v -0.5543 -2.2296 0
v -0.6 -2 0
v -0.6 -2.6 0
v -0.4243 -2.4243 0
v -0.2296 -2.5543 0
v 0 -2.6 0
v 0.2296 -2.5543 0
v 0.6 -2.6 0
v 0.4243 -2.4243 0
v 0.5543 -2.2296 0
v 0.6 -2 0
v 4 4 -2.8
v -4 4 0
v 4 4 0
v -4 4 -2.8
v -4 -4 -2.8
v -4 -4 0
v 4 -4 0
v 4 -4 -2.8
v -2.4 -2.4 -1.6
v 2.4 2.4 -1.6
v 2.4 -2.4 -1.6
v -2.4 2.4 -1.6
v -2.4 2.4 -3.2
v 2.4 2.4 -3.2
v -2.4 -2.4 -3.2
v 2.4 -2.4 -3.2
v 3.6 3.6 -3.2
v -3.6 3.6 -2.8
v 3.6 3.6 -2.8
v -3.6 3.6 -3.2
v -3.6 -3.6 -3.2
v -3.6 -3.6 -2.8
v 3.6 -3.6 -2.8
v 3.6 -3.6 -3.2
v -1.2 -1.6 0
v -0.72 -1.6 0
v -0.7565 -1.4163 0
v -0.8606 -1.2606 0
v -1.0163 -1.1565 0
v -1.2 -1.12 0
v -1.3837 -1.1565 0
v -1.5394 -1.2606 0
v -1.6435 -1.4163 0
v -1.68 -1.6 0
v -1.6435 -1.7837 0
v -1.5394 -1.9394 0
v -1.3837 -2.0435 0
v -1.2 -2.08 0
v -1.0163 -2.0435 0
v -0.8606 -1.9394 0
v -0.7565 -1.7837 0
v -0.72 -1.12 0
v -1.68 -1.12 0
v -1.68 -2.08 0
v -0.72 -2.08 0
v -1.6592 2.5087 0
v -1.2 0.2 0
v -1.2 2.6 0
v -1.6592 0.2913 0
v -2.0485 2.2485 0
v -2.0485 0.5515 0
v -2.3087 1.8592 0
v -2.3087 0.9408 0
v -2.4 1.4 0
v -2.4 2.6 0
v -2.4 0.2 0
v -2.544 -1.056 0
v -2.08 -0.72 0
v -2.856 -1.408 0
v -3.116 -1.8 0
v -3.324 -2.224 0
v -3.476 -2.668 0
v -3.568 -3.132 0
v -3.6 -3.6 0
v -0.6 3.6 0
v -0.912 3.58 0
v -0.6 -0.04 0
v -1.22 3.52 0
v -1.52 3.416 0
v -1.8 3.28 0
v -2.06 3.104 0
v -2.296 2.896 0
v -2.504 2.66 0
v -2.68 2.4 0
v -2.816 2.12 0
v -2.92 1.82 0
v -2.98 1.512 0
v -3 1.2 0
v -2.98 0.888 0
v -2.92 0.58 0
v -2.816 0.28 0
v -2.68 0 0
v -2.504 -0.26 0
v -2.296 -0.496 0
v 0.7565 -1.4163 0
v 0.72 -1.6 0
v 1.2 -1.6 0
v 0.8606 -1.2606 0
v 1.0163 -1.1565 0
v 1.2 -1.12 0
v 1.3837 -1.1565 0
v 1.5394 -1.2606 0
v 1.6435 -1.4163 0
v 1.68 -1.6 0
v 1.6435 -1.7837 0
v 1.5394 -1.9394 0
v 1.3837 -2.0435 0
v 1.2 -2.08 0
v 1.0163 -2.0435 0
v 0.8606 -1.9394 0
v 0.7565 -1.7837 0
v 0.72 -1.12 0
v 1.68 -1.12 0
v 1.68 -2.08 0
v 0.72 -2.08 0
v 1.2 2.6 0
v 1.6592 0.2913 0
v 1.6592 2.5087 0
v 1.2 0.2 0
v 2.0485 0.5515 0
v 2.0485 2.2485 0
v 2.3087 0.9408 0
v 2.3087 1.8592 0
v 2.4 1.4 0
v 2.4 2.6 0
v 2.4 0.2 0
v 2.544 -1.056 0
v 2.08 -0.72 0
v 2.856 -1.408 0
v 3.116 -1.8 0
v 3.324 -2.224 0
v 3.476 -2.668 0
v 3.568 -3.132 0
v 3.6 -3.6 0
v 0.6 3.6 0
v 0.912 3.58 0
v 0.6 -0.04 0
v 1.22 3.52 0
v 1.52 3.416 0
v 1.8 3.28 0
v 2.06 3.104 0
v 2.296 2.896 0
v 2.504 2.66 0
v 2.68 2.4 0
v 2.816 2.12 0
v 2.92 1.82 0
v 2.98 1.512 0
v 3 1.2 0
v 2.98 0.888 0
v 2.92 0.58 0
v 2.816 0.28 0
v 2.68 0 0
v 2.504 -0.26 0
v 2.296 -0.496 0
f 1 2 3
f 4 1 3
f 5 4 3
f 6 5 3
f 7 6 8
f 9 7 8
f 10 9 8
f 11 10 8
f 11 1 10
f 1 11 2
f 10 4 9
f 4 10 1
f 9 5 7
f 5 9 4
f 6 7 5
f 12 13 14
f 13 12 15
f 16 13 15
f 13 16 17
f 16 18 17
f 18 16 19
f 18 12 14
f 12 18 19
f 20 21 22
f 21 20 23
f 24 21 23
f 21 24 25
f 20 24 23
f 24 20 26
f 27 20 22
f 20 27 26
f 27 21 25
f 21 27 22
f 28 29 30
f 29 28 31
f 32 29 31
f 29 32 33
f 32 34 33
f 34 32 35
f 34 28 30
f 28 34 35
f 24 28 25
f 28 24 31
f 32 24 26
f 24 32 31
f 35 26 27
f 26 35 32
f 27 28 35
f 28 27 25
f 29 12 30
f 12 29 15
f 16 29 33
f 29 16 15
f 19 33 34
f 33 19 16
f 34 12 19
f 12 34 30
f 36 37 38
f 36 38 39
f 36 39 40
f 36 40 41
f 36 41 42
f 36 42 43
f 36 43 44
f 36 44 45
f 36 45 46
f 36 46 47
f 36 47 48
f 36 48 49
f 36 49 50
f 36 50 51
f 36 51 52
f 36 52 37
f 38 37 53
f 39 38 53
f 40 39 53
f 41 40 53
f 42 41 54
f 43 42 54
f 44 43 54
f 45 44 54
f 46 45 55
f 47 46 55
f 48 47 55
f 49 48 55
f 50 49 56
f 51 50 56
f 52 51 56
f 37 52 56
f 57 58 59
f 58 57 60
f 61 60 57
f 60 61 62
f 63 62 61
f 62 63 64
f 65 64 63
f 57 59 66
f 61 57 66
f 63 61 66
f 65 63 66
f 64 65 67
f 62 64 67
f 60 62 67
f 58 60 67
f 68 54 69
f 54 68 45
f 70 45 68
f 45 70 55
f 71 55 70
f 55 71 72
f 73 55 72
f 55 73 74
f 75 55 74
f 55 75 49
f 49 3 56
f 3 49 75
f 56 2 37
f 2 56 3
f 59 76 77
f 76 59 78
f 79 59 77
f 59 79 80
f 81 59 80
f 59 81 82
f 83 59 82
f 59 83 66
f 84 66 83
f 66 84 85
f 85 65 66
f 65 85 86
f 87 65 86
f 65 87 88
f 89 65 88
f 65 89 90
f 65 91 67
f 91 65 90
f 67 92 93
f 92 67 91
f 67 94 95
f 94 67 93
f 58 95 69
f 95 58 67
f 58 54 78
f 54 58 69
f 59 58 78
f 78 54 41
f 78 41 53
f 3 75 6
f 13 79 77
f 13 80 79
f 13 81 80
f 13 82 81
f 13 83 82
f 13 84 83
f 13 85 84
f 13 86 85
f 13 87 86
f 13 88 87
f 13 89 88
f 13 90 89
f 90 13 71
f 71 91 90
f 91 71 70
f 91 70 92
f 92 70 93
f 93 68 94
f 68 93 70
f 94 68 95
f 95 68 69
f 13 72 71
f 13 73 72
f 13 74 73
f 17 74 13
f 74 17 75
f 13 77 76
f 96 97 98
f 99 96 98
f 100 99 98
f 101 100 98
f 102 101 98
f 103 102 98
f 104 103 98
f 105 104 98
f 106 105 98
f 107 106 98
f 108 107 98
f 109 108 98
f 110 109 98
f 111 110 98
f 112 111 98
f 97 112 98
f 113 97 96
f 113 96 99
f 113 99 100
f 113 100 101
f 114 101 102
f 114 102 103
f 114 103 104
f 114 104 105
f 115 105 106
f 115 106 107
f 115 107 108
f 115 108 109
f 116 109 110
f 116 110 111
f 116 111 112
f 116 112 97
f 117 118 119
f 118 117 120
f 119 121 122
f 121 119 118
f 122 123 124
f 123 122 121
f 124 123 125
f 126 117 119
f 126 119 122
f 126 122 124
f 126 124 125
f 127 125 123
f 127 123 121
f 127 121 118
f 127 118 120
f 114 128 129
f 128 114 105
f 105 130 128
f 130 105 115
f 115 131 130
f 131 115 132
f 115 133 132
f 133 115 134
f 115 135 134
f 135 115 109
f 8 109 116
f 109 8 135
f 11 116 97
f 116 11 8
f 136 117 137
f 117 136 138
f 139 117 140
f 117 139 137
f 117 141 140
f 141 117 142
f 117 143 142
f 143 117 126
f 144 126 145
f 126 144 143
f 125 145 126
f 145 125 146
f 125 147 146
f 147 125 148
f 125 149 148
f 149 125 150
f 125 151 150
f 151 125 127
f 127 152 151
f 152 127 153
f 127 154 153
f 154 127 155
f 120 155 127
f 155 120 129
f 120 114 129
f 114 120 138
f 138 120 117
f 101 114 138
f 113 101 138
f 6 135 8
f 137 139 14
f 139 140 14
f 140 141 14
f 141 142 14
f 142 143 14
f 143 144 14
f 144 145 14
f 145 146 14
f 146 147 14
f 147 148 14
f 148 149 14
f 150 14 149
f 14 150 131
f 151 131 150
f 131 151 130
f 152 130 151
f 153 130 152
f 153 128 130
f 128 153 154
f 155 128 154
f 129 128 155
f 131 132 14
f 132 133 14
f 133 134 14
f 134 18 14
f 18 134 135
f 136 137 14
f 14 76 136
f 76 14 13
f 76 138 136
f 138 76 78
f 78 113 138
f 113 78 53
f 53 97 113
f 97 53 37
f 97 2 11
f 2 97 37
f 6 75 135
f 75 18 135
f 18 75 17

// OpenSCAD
// file: ../p/box5.scad
use <../lib.scad>
function ldraw_lib__box5() = [
// 0 Box with 5 Faces and All Edges
// 0 Name: box5.dat
// 0 Author: James Jessiman
// 0 !LDRAW_ORG Primitive UPDATE 2012-01
// 0 !LICENSE Licensed under CC BY 2.0 and CC BY 4.0 : see CAreadme.txt
// 
// 0 BFC CERTIFY CCW
  [0,"BFC","CERTIFY"],
  [0,"BFC","CCW"],
// 
// 0 !HISTORY 2002-04-03 [sbliss] Modified for BFC compliance
// 0 !HISTORY 2002-04-25 [PTadmin] Official Update 2002-02
// 0 !HISTORY 2007-06-24 [PTadmin] Header formatted for Contributor Agreement
// 0 !HISTORY 2008-07-01 [PTadmin] Official Update 2008-01
// 0 !HISTORY 2012-02-16 [Philo] Changed to CCW
// 0 !HISTORY 2012-03-30 [PTadmin] Official Update 2012-01
// 
// 
// 2 24 1 1 1 -1 1 1
  [2,24,1,1,1,-1,1,1],
// 2 24 -1 1 1 -1 1 -1
  [2,24,-1,1,1,-1,1,-1],
// 2 24 -1 1 -1 1 1 -1
  [2,24,-1,1,-1,1,1,-1],
// 2 24 1 1 -1 1 1 1
  [2,24,1,1,-1,1,1,1],
// 2 24 1 0 1 -1 0 1
  [2,24,1,0,1,-1,0,1],
// 2 24 -1 0 1 -1 0 -1
  [2,24,-1,0,1,-1,0,-1],
// 2 24 -1 0 -1 1 0 -1
  [2,24,-1,0,-1,1,0,-1],
// 2 24 1 0 -1 1 0 1
  [2,24,1,0,-1,1,0,1],
// 2 24 1 0 1 1 1 1
  [2,24,1,0,1,1,1,1],
// 2 24 -1 0 1 -1 1 1
  [2,24,-1,0,1,-1,1,1],
// 2 24 1 0 -1 1 1 -1
  [2,24,1,0,-1,1,1,-1],
// 2 24 -1 0 -1 -1 1 -1
  [2,24,-1,0,-1,-1,1,-1],
// 4 16 -1 1 1 1 1 1 1 1 -1 -1 1 -1
  [4,16,-1,1,1,1,1,1,1,1,-1,-1,1,-1],
// 4 16 -1 1 1 -1 0 1 1 0 1 1 1 1
  [4,16,-1,1,1,-1,0,1,1,0,1,1,1,1],
// 4 16 -1 1 -1 -1 0 -1 -1 0 1 -1 1 1
  [4,16,-1,1,-1,-1,0,-1,-1,0,1,-1,1,1],
// 4 16 1 1 -1 1 0 -1 -1 0 -1 -1 1 -1
  [4,16,1,1,-1,1,0,-1,-1,0,-1,-1,1,-1],
// 4 16 1 1 1 1 0 1 1 0 -1 1 1 -1
  [4,16,1,1,1,1,0,1,1,0,-1,1,1,-1],
];
module ldraw_lib__box5(step=0, col=false, unit=2/5, alt=false, line=0.2, solid=!$preview)
    makepoly(ldraw_lib__box5(), step=step, col=col, unit=unit, alt=alt, line=line, solid=solid);
ldraw_lib__box5(line=0.2);
// file: ../p/box4.scad
use <../lib.scad>
function ldraw_lib__box4() = [
// 0 Box with 4 Faces (2 Parallel Pairs) and All Edges
// 0 Name: box4.dat
// 0 Author: James Jessiman
// 0 !LDRAW_ORG Primitive UPDATE 2012-01
// 0 !LICENSE Licensed under CC BY 2.0 and CC BY 4.0 : see CAreadme.txt
// 
// 0 BFC CERTIFY CCW
  [0,"BFC","CERTIFY"],
  [0,"BFC","CCW"],
// 
// 0 !HISTORY 2002-04-03 [sbliss] Modified for BFC compliance
// 0 !HISTORY 2002-04-25 [PTadmin] Official Update 2002-02
// 0 !HISTORY 2007-06-24 [PTadmin] Header formatted for Contributor Agreement
// 0 !HISTORY 2008-07-01 [PTadmin] Official Update 2008-01
// 0 !HISTORY 2012-02-16 [Philo] Changed to CCW
// 0 !HISTORY 2012-03-30 [PTadmin] Official Update 2012-01
// 
// 
// 2 24 1 1 1 -1 1 1
  [2,24,1,1,1,-1,1,1],
// 2 24 -1 1 1 -1 1 -1
  [2,24,-1,1,1,-1,1,-1],
// 2 24 -1 1 -1 1 1 -1
  [2,24,-1,1,-1,1,1,-1],
// 2 24 1 1 -1 1 1 1
  [2,24,1,1,-1,1,1,1],
// 2 24 1 0 1 -1 0 1
  [2,24,1,0,1,-1,0,1],
// 2 24 -1 0 1 -1 0 -1
  [2,24,-1,0,1,-1,0,-1],
// 2 24 -1 0 -1 1 0 -1
  [2,24,-1,0,-1,1,0,-1],
// 2 24 1 0 -1 1 0 1
  [2,24,1,0,-1,1,0,1],
// 2 24 1 0 1 1 1 1
  [2,24,1,0,1,1,1,1],
// 2 24 -1 0 1 -1 1 1
  [2,24,-1,0,1,-1,1,1],
// 2 24 1 0 -1 1 1 -1
  [2,24,1,0,-1,1,1,-1],
// 2 24 -1 0 -1 -1 1 -1
  [2,24,-1,0,-1,-1,1,-1],
// 4 16 -1 1 1 -1 0 1 1 0 1 1 1 1
  [4,16,-1,1,1,-1,0,1,1,0,1,1,1,1],
// 4 16 -1 1 -1 -1 0 -1 -1 0 1 -1 1 1
  [4,16,-1,1,-1,-1,0,-1,-1,0,1,-1,1,1],
// 4 16 1 1 -1 1 0 -1 -1 0 -1 -1 1 -1
  [4,16,1,1,-1,1,0,-1,-1,0,-1,-1,1,-1],
// 4 16 1 1 1 1 0 1 1 0 -1 1 1 -1
  [4,16,1,1,1,1,0,1,1,0,-1,1,1,-1],
];
module ldraw_lib__box4(step=0, col=false, unit=2/5, alt=false, line=0.2, solid=!$preview)
    makepoly(ldraw_lib__box4(), step=step, col=col, unit=unit, alt=alt, line=line, solid=solid);
ldraw_lib__box4(line=0.2);
// file: ../p/4-4ndis.scad
use <../lib.scad>
function ldraw_lib__4_4ndis() = [
// 0 Disc Negative 1.0
// 0 Name: 4-4ndis.dat
// 0 Author: James Jessiman
// 0 !LDRAW_ORG Primitive UPDATE 2012-01
// 0 !LICENSE Licensed under CC BY 2.0 and CC BY 4.0 : see CAreadme.txt
// 
// 0 BFC CERTIFY CCW
  [0,"BFC","CERTIFY"],
  [0,"BFC","CCW"],
// 
// 0 !HISTORY 2002-03-23 [sbliss] Added BFC statement; compacted code
// 0 !HISTORY 2002-04-25 [PTadmin] Official Update 2002-02
// 0 !HISTORY 2007-06-24 [PTadmin] Header formatted for Contributor Agreement
// 0 !HISTORY 2008-07-01 [PTadmin] Official Update 2008-01
// 0 !HISTORY 2012-02-16 [Philo] Changed to CCW
// 0 !HISTORY 2012-03-30 [PTadmin] Official Update 2012-01
// 
// 
// 3 16 0.9239 0 0.3827 1 0 0 1 0 1
  [3,16,0.9239,0,0.3827,1,0,0,1,0,1],
// 3 16 0.7071 0 0.7071 0.9239 0 0.3827 1 0 1
  [3,16,0.7071,0,0.7071,0.9239,0,0.3827,1,0,1],
// 3 16 0.3827 0 0.9239 0.7071 0 0.7071 1 0 1
  [3,16,0.3827,0,0.9239,0.7071,0,0.7071,1,0,1],
// 3 16 0 0 1 0.3827 0 0.9239 1 0 1
  [3,16,0,0,1,0.3827,0,0.9239,1,0,1],
// 3 16 -0.3827 0 0.9239 0 0 1 -1 0 1
  [3,16,-0.3827,0,0.9239,0,0,1,-1,0,1],
// 3 16 -0.7071 0 0.7071 -0.3827 0 0.9239 -1 0 1
  [3,16,-0.7071,0,0.7071,-0.3827,0,0.9239,-1,0,1],
// 3 16 -0.9239 0 0.3827 -0.7071 0 0.7071 -1 0 1
  [3,16,-0.9239,0,0.3827,-0.7071,0,0.7071,-1,0,1],
// 3 16 -1 0 0 -0.9239 0 0.3827 -1 0 1
  [3,16,-1,0,0,-0.9239,0,0.3827,-1,0,1],
// 3 16 -0.9239 0 -0.3827 -1 0 0 -1 0 -1
  [3,16,-0.9239,0,-0.3827,-1,0,0,-1,0,-1],
// 3 16 -0.7071 0 -0.7071 -0.9239 0 -0.3827 -1 0 -1
  [3,16,-0.7071,0,-0.7071,-0.9239,0,-0.3827,-1,0,-1],
// 3 16 -0.3827 0 -0.9239 -0.7071 0 -0.7071 -1 0 -1
  [3,16,-0.3827,0,-0.9239,-0.7071,0,-0.7071,-1,0,-1],
// 3 16 0 0 -1 -0.3827 0 -0.9239 -1 0 -1
  [3,16,0,0,-1,-0.3827,0,-0.9239,-1,0,-1],
// 3 16 0.3827 0 -0.9239 0 0 -1 1 0 -1
  [3,16,0.3827,0,-0.9239,0,0,-1,1,0,-1],
// 3 16 0.7071 0 -0.7071 0.3827 0 -0.9239 1 0 -1
  [3,16,0.7071,0,-0.7071,0.3827,0,-0.9239,1,0,-1],
// 3 16 0.9239 0 -0.3827 0.7071 0 -0.7071 1 0 -1
  [3,16,0.9239,0,-0.3827,0.7071,0,-0.7071,1,0,-1],
// 3 16 1 0 0 0.9239 0 -0.3827 1 0 -1
  [3,16,1,0,0,0.9239,0,-0.3827,1,0,-1],
];
module ldraw_lib__4_4ndis(step=0, col=false, unit=2/5, alt=false, line=0.2, solid=!$preview)
    makepoly(ldraw_lib__4_4ndis(), step=step, col=col, unit=unit, alt=alt, line=line, solid=solid);
ldraw_lib__4_4ndis(line=0.2);
// file: ../p/4-4disc.scad
use <../lib.scad>
function ldraw_lib__4_4disc() = [
// 0 Disc 1.0
// 0 Name: 4-4disc.dat
// 0 Author: James Jessiman
// 0 !LDRAW_ORG Primitive UPDATE 2002-02
// 0 !LICENSE Licensed under CC BY 2.0 and CC BY 4.0 : see CAreadme.txt
// 
// 0 BFC CERTIFY CCW
  [0,"BFC","CERTIFY"],
  [0,"BFC","CCW"],
// 
// 0 !HISTORY 1998-12-15 [PTadmin] Official Update 1998-10
// 0 !HISTORY 2002-03-23 [sbliss] Added BFC statement
// 0 !HISTORY 2002-04-25 [PTadmin] Official Update 2002-02
// 0 !HISTORY 2007-06-24 [PTadmin] Header formatted for Contributor Agreement
// 0 !HISTORY 2008-07-01 [PTadmin] Official Update 2008-01
// 
// 
// 3 16 0 0 0 1 0 0 0.9239 0 0.3827
  [3,16,0,0,0,1,0,0,0.9239,0,0.3827],
// 3 16 0 0 0 0.9239 0 0.3827 0.7071 0 0.7071
  [3,16,0,0,0,0.9239,0,0.3827,0.7071,0,0.7071],
// 3 16 0 0 0 0.7071 0 0.7071 0.3827 0 0.9239
  [3,16,0,0,0,0.7071,0,0.7071,0.3827,0,0.9239],
// 3 16 0 0 0 0.3827 0 0.9239 0 0 1
  [3,16,0,0,0,0.3827,0,0.9239,0,0,1],
// 3 16 0 0 0 0 0 1 -0.3827 0 0.9239
  [3,16,0,0,0,0,0,1,-0.3827,0,0.9239],
// 3 16 0 0 0 -0.3827 0 0.9239 -0.7071 0 0.7071
  [3,16,0,0,0,-0.3827,0,0.9239,-0.7071,0,0.7071],
// 3 16 0 0 0 -0.7071 0 0.7071 -0.9239 0 0.3827
  [3,16,0,0,0,-0.7071,0,0.7071,-0.9239,0,0.3827],
// 3 16 0 0 0 -0.9239 0 0.3827 -1 0 -0
  [3,16,0,0,0,-0.9239,0,0.3827,-1,0,-0],
// 3 16 0 0 0 -1 0 -0 -0.9239 0 -0.3827
  [3,16,0,0,0,-1,0,-0,-0.9239,0,-0.3827],
// 3 16 0 0 0 -0.9239 0 -0.3827 -0.7071 0 -0.7071
  [3,16,0,0,0,-0.9239,0,-0.3827,-0.7071,0,-0.7071],
// 3 16 0 0 0 -0.7071 0 -0.7071 -0.3827 0 -0.9239
  [3,16,0,0,0,-0.7071,0,-0.7071,-0.3827,0,-0.9239],
// 3 16 0 0 0 -0.3827 0 -0.9239 0 0 -1
  [3,16,0,0,0,-0.3827,0,-0.9239,0,0,-1],
// 3 16 0 0 0 0 0 -1 0.3827 0 -0.9239
  [3,16,0,0,0,0,0,-1,0.3827,0,-0.9239],
// 3 16 0 0 0 0.3827 0 -0.9239 0.7071 0 -0.7071
  [3,16,0,0,0,0.3827,0,-0.9239,0.7071,0,-0.7071],
// 3 16 0 0 0 0.7071 0 -0.7071 0.9239 0 -0.3827
  [3,16,0,0,0,0.7071,0,-0.7071,0.9239,0,-0.3827],
// 3 16 0 0 0 0.9239 0 -0.3827 1 0 0
  [3,16,0,0,0,0.9239,0,-0.3827,1,0,0],
// 0
];
module ldraw_lib__4_4disc(step=0, col=false, unit=2/5, alt=false, line=0.2, solid=!$preview)
    makepoly(ldraw_lib__4_4disc(), step=step, col=col, unit=unit, alt=alt, line=line, solid=solid);
ldraw_lib__4_4disc(line=0.2);
// file: s/3070bs01.scad
use <../../lib.scad>
use <../../p/box4.scad>
use <../../p/box5.scad>
function ldraw_lib__s__3070bs01() = [
// 0 ~Tile  1 x  1 with Groove without Top Face
// 0 Name: s\3070bs01.dat
// 0 Author: Chris Dee [cwdee]
// 0 !LDRAW_ORG Subpart UPDATE 2009-02
// 0 !LICENSE Licensed under CC BY 2.0 and CC BY 4.0 : see CAreadme.txt
// 
// 0 BFC CERTIFY CCW
  [0,"BFC","CERTIFY"],
  [0,"BFC","CCW"],
// 
// 0 !HISTORY 2009-09-03 [PTadmin] Official Update 2009-02
// 
// 
// 1 16 0 0 0 10 0 0 0 7 0 0 0 10 box4.dat
  [1,16,0,0,0,10,0,0,0,7,0,0,0,10, ldraw_lib__box4()],
// 0 BFC INVERTNEXT
  [0,"BFC","INVERTNEXT"],
// 1 16 0 8 0 6 0 0 0 -4 0 0 0 6 box5.dat
  [1,16,0,8,0,6,0,0,0,-4,0,0,0,6, ldraw_lib__box5()],
// 1 16 0 7 0 9 0 0 0 1 0 0 0 9 box4.dat
  [1,16,0,7,0,9,0,0,0,1,0,0,0,9, ldraw_lib__box4()],
// 
// 4 16 9 8 9 6 8 6 -6 8 6 -9 8 9
  [4,16,9,8,9,6,8,6,-6,8,6,-9,8,9],
// 4 16 -9 8 9 -6 8 6 -6 8 -6 -9 8 -9
  [4,16,-9,8,9,-6,8,6,-6,8,-6,-9,8,-9],
// 4 16 -9 8 -9 -6 8 -6 6 8 -6 9 8 -9
  [4,16,-9,8,-9,-6,8,-6,6,8,-6,9,8,-9],
// 4 16 9 8 -9 6 8 -6 6 8 6 9 8 9
  [4,16,9,8,-9,6,8,-6,6,8,6,9,8,9],
// 
// 4 16 10 7 10 9 7 9 -9 7 9 -10 7 10
  [4,16,10,7,10,9,7,9,-9,7,9,-10,7,10],
// 4 16 -10 7 10 -9 7 9 -9 7 -9 -10 7 -10
  [4,16,-10,7,10,-9,7,9,-9,7,-9,-10,7,-10],
// 4 16 -10 7 -10 -9 7 -9 9 7 -9 10 7 -10
  [4,16,-10,7,-10,-9,7,-9,9,7,-9,10,7,-10],
// 4 16 10 7 -10 9 7 -9 9 7 9 10 7 10
  [4,16,10,7,-10,9,7,-9,9,7,9,10,7,10],
// 0
];
module ldraw_lib__s__3070bs01(step=0, col=false, unit=2/5, alt=false, line=0.2, solid=!$preview)
    makepoly(ldraw_lib__s__3070bs01(), step=step, col=col, unit=unit, alt=alt, line=line, solid=solid);
ldraw_lib__s__3070bs01(line=0.2);
// file: s/3070bp11s01.scad
use <../../lib.scad>
use <../../p/2-4chrd.scad>
use <../../p/2-4ndis.scad>
use <../../p/4-4disc.scad>
use <../../p/4-4ndis.scad>
function ldraw_lib__s__3070bp11s01() = [
// 0 ~Tile  1 x  1 with White Bunny Rabbit Face with Black Eyes and Dark Pink Ears and Nose Pattern - Half
// 0 Name: s\3070bp11s01.dat
// 0 Author: Takeshi Takahashi [RainbowDolphin]
// 0 !LDRAW_ORG Subpart UPDATE 2022-03
// 0 !LICENSE Licensed under CC BY 2.0 and CC BY 4.0 : see CAreadme.txt
// 
// 0 BFC CERTIFY CCW
  [0,"BFC","CERTIFY"],
  [0,"BFC","CCW"],
// 
// 0 !HISTORY 2022-05-07 [PTadmin] Official Update 2022-03
// 
// 
// 1 0 -3 0 -4 1.2 0 0 0 1 0 0 0 1.2 4-4disc.dat
  [1,0,-3,0,-4,1.2,0,0,0,1,0,0,0,1.2, ldraw_lib__4_4disc()],
// 1 15 -3 0 -4 1.2 0 0 0 1 0 0 0 1.2 4-4ndis.dat
  [1,15,-3,0,-4,1.2,0,0,0,1,0,0,0,1.2, ldraw_lib__4_4ndis()],
// 1 5 -3 0 3.5 0 0 -3 0 1 0 3 0 0 2-4chrd.dat
  [1,5,-3,0,3.5,0,0,-3,0,1,0,3,0,0, ldraw_lib__2_4chrd()],
// 1 15 -3 0 3.5 0 0 -3 0 1 0 3 0 0 2-4ndis.dat
  [1,15,-3,0,3.5,0,0,-3,0,1,0,3,0,0, ldraw_lib__2_4ndis()],
// 4 15 -4.2 0 -2.8 -5.2 0 -1.8 -6.36 0 -2.64 -4.2 0 -4
  [4,15,-4.2,0,-2.8,-5.2,0,-1.8,-6.36,0,-2.64,-4.2,0,-4],
// 4 15 -4.2 0 -4 -6.36 0 -2.64 -7.14 0 -3.52 -4.2 0 -5.2
  [4,15,-4.2,0,-4,-6.36,0,-2.64,-7.14,0,-3.52,-4.2,0,-5.2],
// 4 15 -4.2 0 -5.2 -7.14 0 -3.52 -7.79 0 -4.5 -8.31 0 -5.56
  [4,15,-4.2,0,-5.2,-7.14,0,-3.52,-7.79,0,-4.5,-8.31,0,-5.56],
// 4 15 -4.2 0 -5.2 -8.31 0 -5.56 -8.69 0 -6.67 -8.92 0 -7.83
  [4,15,-4.2,0,-5.2,-8.31,0,-5.56,-8.69,0,-6.67,-8.92,0,-7.83],
// 4 15 -3 0 -5.2 -4.2 0 -5.2 -8.92 0 -7.83 -9 0 -9
  [4,15,-3,0,-5.2,-4.2,0,-5.2,-8.92,0,-7.83,-9,0,-9],
// 4 15 -1.8 0 -5.2 -3 0 -5.2 -9 0 -9 -1.5 0 -6.5
  [4,15,-1.8,0,-5.2,-3,0,-5.2,-9,0,-9,-1.5,0,-6.5],
// 4 15 -1.8 0 -5.2 -1.5 0 -6.5 -1.5 0 -5 -1.8 0 -4
  [4,15,-1.8,0,-5.2,-1.5,0,-6.5,-1.5,0,-5,-1.8,0,-4],
// 4 15 -1.5 0 -0.1 -1.5 0 9 -2.28 0 8.95 -3 0 6.5
  [4,15,-1.5,0,-0.1,-1.5,0,9,-2.28,0,8.95,-3,0,6.5],
// 4 15 -3 0 6.5 -2.28 0 8.95 -3.05 0 8.8 -3.8 0 8.54
  [4,15,-3,0,6.5,-2.28,0,8.95,-3.05,0,8.8,-3.8,0,8.54],
// 4 15 -3 0 6.5 -3.8 0 8.54 -4.5 0 8.2 -5.15 0 7.76
  [4,15,-3,0,6.5,-3.8,0,8.54,-4.5,0,8.2,-5.15,0,7.76],
// 4 15 -3 0 6.5 -5.15 0 7.76 -5.74 0 7.24 -6 0 6.5
  [4,15,-3,0,6.5,-5.15,0,7.76,-5.74,0,7.24,-6,0,6.5],
// 4 15 -6 0 6.5 -5.74 0 7.24 -6.26 0 6.65 -6.7 0 6
  [4,15,-6,0,6.5,-5.74,0,7.24,-6.26,0,6.65,-6.7,0,6],
// 4 15 -6 0 3.5 -6 0 6.5 -6.7 0 6 -7.04 0 5.3
  [4,15,-6,0,3.5,-6,0,6.5,-6.7,0,6,-7.04,0,5.3],
// 4 15 -6 0 3.5 -7.04 0 5.3 -7.3 0 4.55 -7.45 0 3.78
  [4,15,-6,0,3.5,-7.04,0,5.3,-7.3,0,4.55,-7.45,0,3.78],
// 4 15 -6 0 3.5 -7.45 0 3.78 -7.5 0 3 -7.45 0 2.22
  [4,15,-6,0,3.5,-7.45,0,3.78,-7.5,0,3,-7.45,0,2.22],
// 4 15 -6 0 3.5 -7.45 0 2.22 -7.3 0 1.45 -6 0 0.5
  [4,15,-6,0,3.5,-7.45,0,2.22,-7.3,0,1.45,-6,0,0.5],
// 4 15 -6 0 0.5 -7.3 0 1.45 -7.04 0 0.7 -6.7 0 0
  [4,15,-6,0,0.5,-7.3,0,1.45,-7.04,0,0.7,-6.7,0,0],
// 4 15 -6 0 0.5 -6.7 0 0 -6.26 0 -0.65 -5.74 0 -1.24
  [4,15,-6,0,0.5,-6.7,0,0,-6.26,0,-0.65,-5.74,0,-1.24],
// 4 15 -3 0 0.5 -6 0 0.5 -5.74 0 -1.24 -5.2 0 -1.8
  [4,15,-3,0,0.5,-6,0,0.5,-5.74,0,-1.24,-5.2,0,-1.8],
// 4 15 -1.5 0 -0.1 -3 0 0.5 -5.2 0 -1.8 -4.2 0 -2.8
  [4,15,-1.5,0,-0.1,-3,0,0.5,-5.2,0,-1.8,-4.2,0,-2.8],
// 3 15 -3 0 6.5 -3 0 0.5 -1.5 0 -0.1
  [3,15,-3,0,6.5,-3,0,0.5,-1.5,0,-0.1],
// 3 15 -1.5 0 -0.1 -4.2 0 -2.8 -3 0 -2.8
  [3,15,-1.5,0,-0.1,-4.2,0,-2.8,-3,0,-2.8],
// 3 15 -1.5 0 -0.1 -3 0 -2.8 -1.8 0 -2.8
  [3,15,-1.5,0,-0.1,-3,0,-2.8,-1.8,0,-2.8],
// 3 15 -1.5 0 -6.5 -9 0 -9 0 0 -6.5
  [3,15,-1.5,0,-6.5,-9,0,-9,0,0,-6.5],
// 3 16 -10 0 10 -3.05 0 8.8 -2.28 0 8.95
  [3,16,-10,0,10,-3.05,0,8.8,-2.28,0,8.95],
// 3 16 -10 0 10 -3.8 0 8.54 -3.05 0 8.8
  [3,16,-10,0,10,-3.8,0,8.54,-3.05,0,8.8],
// 3 16 -10 0 10 -4.5 0 8.2 -3.8 0 8.54
  [3,16,-10,0,10,-4.5,0,8.2,-3.8,0,8.54],
// 3 16 -10 0 10 -5.15 0 7.76 -4.5 0 8.2
  [3,16,-10,0,10,-5.15,0,7.76,-4.5,0,8.2],
// 3 16 -10 0 10 -5.74 0 7.24 -5.15 0 7.76
  [3,16,-10,0,10,-5.74,0,7.24,-5.15,0,7.76],
// 3 16 -10 0 10 -6.26 0 6.65 -5.74 0 7.24
  [3,16,-10,0,10,-6.26,0,6.65,-5.74,0,7.24],
// 3 16 -10 0 10 -6.7 0 6 -6.26 0 6.65
  [3,16,-10,0,10,-6.7,0,6,-6.26,0,6.65],
// 3 16 -10 0 10 -7.04 0 5.3 -6.7 0 6
  [3,16,-10,0,10,-7.04,0,5.3,-6.7,0,6],
// 3 16 -10 0 10 -7.3 0 4.55 -7.04 0 5.3
  [3,16,-10,0,10,-7.3,0,4.55,-7.04,0,5.3],
// 3 16 -10 0 10 -7.45 0 3.78 -7.3 0 4.55
  [3,16,-10,0,10,-7.45,0,3.78,-7.3,0,4.55],
// 3 16 -10 0 10 -7.5 0 3 -7.45 0 3.78
  [3,16,-10,0,10,-7.5,0,3,-7.45,0,3.78],
// 4 16 -7.5 0 3 -10 0 10 -7.79 0 -4.5 -7.45 0 2.22
  [4,16,-7.5,0,3,-10,0,10,-7.79,0,-4.5,-7.45,0,2.22],
// 4 16 -7.3 0 1.45 -7.45 0 2.22 -7.79 0 -4.5 -7.14 0 -3.52
  [4,16,-7.3,0,1.45,-7.45,0,2.22,-7.79,0,-4.5,-7.14,0,-3.52],
// 3 16 -7.3 0 1.45 -7.14 0 -3.52 -7.04 0 0.7
  [3,16,-7.3,0,1.45,-7.14,0,-3.52,-7.04,0,0.7],
// 3 16 -7.04 0 0.7 -7.14 0 -3.52 -6.7 0 0
  [3,16,-7.04,0,0.7,-7.14,0,-3.52,-6.7,0,0],
// 4 16 -6.26 0 -0.65 -6.7 0 0 -7.14 0 -3.52 -6.36 0 -2.64
  [4,16,-6.26,0,-0.65,-6.7,0,0,-7.14,0,-3.52,-6.36,0,-2.64],
// 3 16 -6.26 0 -0.65 -6.36 0 -2.64 -5.74 0 -1.24
  [3,16,-6.26,0,-0.65,-6.36,0,-2.64,-5.74,0,-1.24],
// 3 16 -5.74 0 -1.24 -6.36 0 -2.64 -5.2 0 -1.8
  [3,16,-5.74,0,-1.24,-6.36,0,-2.64,-5.2,0,-1.8],
// 3 16 -10 0 10 -8.31 0 -5.56 -7.79 0 -4.5
  [3,16,-10,0,10,-8.31,0,-5.56,-7.79,0,-4.5],
// 3 16 -10 0 10 -8.69 0 -6.67 -8.31 0 -5.56
  [3,16,-10,0,10,-8.69,0,-6.67,-8.31,0,-5.56],
// 3 16 -10 0 10 -8.92 0 -7.83 -8.69 0 -6.67
  [3,16,-10,0,10,-8.92,0,-7.83,-8.69,0,-6.67],
// 4 16 -9 0 -9 -8.92 0 -7.83 -10 0 10 -10 0 -10
  [4,16,-9,0,-9,-8.92,0,-7.83,-10,0,10,-10,0,-10],
// 3 16 -10 0 10 -2.28 0 8.95 -1.5 0 9
  [3,16,-10,0,10,-2.28,0,8.95,-1.5,0,9],
];
module ldraw_lib__s__3070bp11s01(step=0, col=false, unit=2/5, alt=false, line=0.2, solid=!$preview)
    makepoly(ldraw_lib__s__3070bp11s01(), step=step, col=col, unit=unit, alt=alt, line=line, solid=solid);
ldraw_lib__s__3070bp11s01(line=0.2);
// file: ../p/2-4ndis.scad
use <../lib.scad>
function ldraw_lib__2_4ndis() = [
// 0 Disc Negative 0.5
// 0 Name: 2-4ndis.dat
// 0 Author: James Jessiman
// 0 !LDRAW_ORG Primitive UPDATE 2012-01
// 0 !LICENSE Licensed under CC BY 2.0 and CC BY 4.0 : see CAreadme.txt
// 
// 0 BFC CERTIFY CCW
  [0,"BFC","CERTIFY"],
  [0,"BFC","CCW"],
// 
// 0 !HISTORY 2002-03-23 [sbliss] Added BFC statement; compacted code
// 0 !HISTORY 2002-04-25 [PTadmin] Official Update 2002-02
// 0 !HISTORY 2007-06-24 [PTadmin] Header formatted for Contributor Agreement
// 0 !HISTORY 2008-07-01 [PTadmin] Official Update 2008-01
// 0 !HISTORY 2012-02-16 [Philo] Changed to CCW
// 0 !HISTORY 2012-03-30 [PTadmin] Official Update 2012-01
// 
// 
// 3 16 0.9239 0 0.3827 1 0 0 1 0 1
  [3,16,0.9239,0,0.3827,1,0,0,1,0,1],
// 3 16 0.7071 0 0.7071 0.9239 0 0.3827 1 0 1
  [3,16,0.7071,0,0.7071,0.9239,0,0.3827,1,0,1],
// 3 16 0.3827 0 0.9239 0.7071 0 0.7071 1 0 1
  [3,16,0.3827,0,0.9239,0.7071,0,0.7071,1,0,1],
// 3 16 0 0 1 0.3827 0 0.9239 1 0 1
  [3,16,0,0,1,0.3827,0,0.9239,1,0,1],
// 3 16 -0.3827 0 0.9239 0 0 1 -1 0 1
  [3,16,-0.3827,0,0.9239,0,0,1,-1,0,1],
// 3 16 -0.7071 0 0.7071 -0.3827 0 0.9239 -1 0 1
  [3,16,-0.7071,0,0.7071,-0.3827,0,0.9239,-1,0,1],
// 3 16 -0.9239 0 0.3827 -0.7071 0 0.7071 -1 0 1
  [3,16,-0.9239,0,0.3827,-0.7071,0,0.7071,-1,0,1],
// 3 16 -1 0 0 -0.9239 0 0.3827 -1 0 1
  [3,16,-1,0,0,-0.9239,0,0.3827,-1,0,1],
];
module ldraw_lib__2_4ndis(step=0, col=false, unit=2/5, alt=false, line=0.2, solid=!$preview)
    makepoly(ldraw_lib__2_4ndis(), step=step, col=col, unit=unit, alt=alt, line=line, solid=solid);
ldraw_lib__2_4ndis(line=0.2);
// file: ../p/2-4chrd.scad
use <../lib.scad>
function ldraw_lib__2_4chrd() = [
// 0 Chord 0.5
// 0 Name: 2-4chrd.dat
// 0 Author: Philippe Hurbain [Philo]
// 0 !LDRAW_ORG Primitive UPDATE 2014-01
// 0 !LICENSE Licensed under CC BY 2.0 and CC BY 4.0 : see CAreadme.txt
// 
// 0 BFC CERTIFY CCW
  [0,"BFC","CERTIFY"],
  [0,"BFC","CCW"],
// 
// 0 !HISTORY 2014-06-21 [PTadmin] Official Update 2014-01
// 
// 
// 4 16 0.9239 0 0.3827 -0.9239 0 0.3827 -1 0 0 1 0 0
  [4,16,0.9239,0,0.3827,-0.9239,0,0.3827,-1,0,0,1,0,0],
// 4 16 0.7071 0 0.7071 -0.7071 0 0.7071 -0.9239 0 0.3827 0.9239 0 0.3827
  [4,16,0.7071,0,0.7071,-0.7071,0,0.7071,-0.9239,0,0.3827,0.9239,0,0.3827],
// 4 16 0.3827 0 0.9239 -0.3827 0 0.9239 -0.7071 0 0.7071 0.7071 0 0.7071
  [4,16,0.3827,0,0.9239,-0.3827,0,0.9239,-0.7071,0,0.7071,0.7071,0,0.7071],
// 3 16 0 0 1 -0.3827 0 0.9239 0.3827 0 0.9239
  [3,16,0,0,1,-0.3827,0,0.9239,0.3827,0,0.9239],
];
module ldraw_lib__2_4chrd(step=0, col=false, unit=2/5, alt=false, line=0.2, solid=!$preview)
    makepoly(ldraw_lib__2_4chrd(), step=step, col=col, unit=unit, alt=alt, line=line, solid=solid);
ldraw_lib__2_4chrd(line=0.2);
// main file
use <../lib.scad>
use <../p/2-4chrd.scad>
use <../p/2-4ndis.scad>
use <s/3070bp11s01.scad>
use <s/3070bs01.scad>
function ldraw_lib__3070bp11() = [
// 0 Tile  1 x  1 with White Bunny Rabbit Face with Black Eyes and Dark Pink Ears and Nose Pattern
// 0 Name: 3070bp11.dat
// 0 Author: Takeshi Takahashi [RainbowDolphin]
// 0 !LDRAW_ORG Part UPDATE 2022-03
// 0 !LICENSE Licensed under CC BY 2.0 and CC BY 4.0 : see CAreadme.txt
// 
// 0 BFC CERTIFY CCW
  [0,"BFC","CERTIFY"],
  [0,"BFC","CCW"],
// 
// 0 !KEYWORDS Bricklink 3070bpb142, Dots, Funky Animals, Set 41901
// 
// 0 !HISTORY 2022-05-07 [PTadmin] Official Update 2022-03
// 
// 
// 1 15 0 0 -5 -1.5 0 0 0 1 0 0 0 -1.5 2-4ndis.dat
  [1,15,0,0,-5,-1.5,0,0,0,1,0,0,0,-1.5, ldraw_lib__2_4ndis()],
// 1 5 0 0 -5 -1.5 0 0 0 1 0 0 0 -1.5 2-4chrd.dat
  [1,5,0,0,-5,-1.5,0,0,0,1,0,0,0,-1.5, ldraw_lib__2_4chrd()],
// 1 16 0 0 0 1 0 0 0 1 0 0 0 1 s\3070bs01.dat
  [1,16,0,0,0,1,0,0,0,1,0,0,0,1, ldraw_lib__s__3070bs01()],
// 1 16 0 0 0 1 0 0 0 1 0 0 0 1 s\3070bp11s01.dat
  [1,16,0,0,0,1,0,0,0,1,0,0,0,1, ldraw_lib__s__3070bp11s01()],
// 1 16 0 0 0 -1 0 0 0 1 0 0 0 1 s\3070bp11s01.dat
  [1,16,0,0,0,-1,0,0,0,1,0,0,0,1, ldraw_lib__s__3070bp11s01()],
// 4 16 -10 0 10 -1.5 0 9 1.5 0 9 10 0 10
  [4,16,-10,0,10,-1.5,0,9,1.5,0,9,10,0,10],
// 4 16 1.5 0 -.1 1.5 0 9 -1.5 0 9 -1.5 0 -.1
  [4,16,1.5,0,-.1,1.5,0,9,-1.5,0,9,-1.5,0,-.1],
// 4 15 1.5 0 -.1 -1.5 0 -.1 -1.8 0 -2.8 1.8 0 -2.8
  [4,15,1.5,0,-.1,-1.5,0,-.1,-1.8,0,-2.8,1.8,0,-2.8],
// 4 15 1.8 0 -4 1.8 0 -2.8 -1.8 0 -2.8 -1.8 0 -4
  [4,15,1.8,0,-4,1.8,0,-2.8,-1.8,0,-2.8,-1.8,0,-4],
// 4 15 1.8 0 -4 -1.8 0 -4 -1.5 0 -5 1.5 0 -5
  [4,15,1.8,0,-4,-1.8,0,-4,-1.5,0,-5,1.5,0,-5],
// 
// 3 15 0 0 -6.5 -9 0 -9 9 0 -9
  [3,15,0,0,-6.5,-9,0,-9,9,0,-9],
// 4 16 9 0 -9 -9 0 -9 -10 0 -10 10 0 -10
  [4,16,9,0,-9,-9,0,-9,-10,0,-10,10,0,-10],
];
module ldraw_lib__3070bp11(step=0, col=false, unit=2/5, alt=false, line=0.2, solid=!$preview)
    makepoly(ldraw_lib__3070bp11(), step=step, col=col, unit=unit, alt=alt, line=line, solid=solid);
ldraw_lib__3070bp11(line=0.2);
